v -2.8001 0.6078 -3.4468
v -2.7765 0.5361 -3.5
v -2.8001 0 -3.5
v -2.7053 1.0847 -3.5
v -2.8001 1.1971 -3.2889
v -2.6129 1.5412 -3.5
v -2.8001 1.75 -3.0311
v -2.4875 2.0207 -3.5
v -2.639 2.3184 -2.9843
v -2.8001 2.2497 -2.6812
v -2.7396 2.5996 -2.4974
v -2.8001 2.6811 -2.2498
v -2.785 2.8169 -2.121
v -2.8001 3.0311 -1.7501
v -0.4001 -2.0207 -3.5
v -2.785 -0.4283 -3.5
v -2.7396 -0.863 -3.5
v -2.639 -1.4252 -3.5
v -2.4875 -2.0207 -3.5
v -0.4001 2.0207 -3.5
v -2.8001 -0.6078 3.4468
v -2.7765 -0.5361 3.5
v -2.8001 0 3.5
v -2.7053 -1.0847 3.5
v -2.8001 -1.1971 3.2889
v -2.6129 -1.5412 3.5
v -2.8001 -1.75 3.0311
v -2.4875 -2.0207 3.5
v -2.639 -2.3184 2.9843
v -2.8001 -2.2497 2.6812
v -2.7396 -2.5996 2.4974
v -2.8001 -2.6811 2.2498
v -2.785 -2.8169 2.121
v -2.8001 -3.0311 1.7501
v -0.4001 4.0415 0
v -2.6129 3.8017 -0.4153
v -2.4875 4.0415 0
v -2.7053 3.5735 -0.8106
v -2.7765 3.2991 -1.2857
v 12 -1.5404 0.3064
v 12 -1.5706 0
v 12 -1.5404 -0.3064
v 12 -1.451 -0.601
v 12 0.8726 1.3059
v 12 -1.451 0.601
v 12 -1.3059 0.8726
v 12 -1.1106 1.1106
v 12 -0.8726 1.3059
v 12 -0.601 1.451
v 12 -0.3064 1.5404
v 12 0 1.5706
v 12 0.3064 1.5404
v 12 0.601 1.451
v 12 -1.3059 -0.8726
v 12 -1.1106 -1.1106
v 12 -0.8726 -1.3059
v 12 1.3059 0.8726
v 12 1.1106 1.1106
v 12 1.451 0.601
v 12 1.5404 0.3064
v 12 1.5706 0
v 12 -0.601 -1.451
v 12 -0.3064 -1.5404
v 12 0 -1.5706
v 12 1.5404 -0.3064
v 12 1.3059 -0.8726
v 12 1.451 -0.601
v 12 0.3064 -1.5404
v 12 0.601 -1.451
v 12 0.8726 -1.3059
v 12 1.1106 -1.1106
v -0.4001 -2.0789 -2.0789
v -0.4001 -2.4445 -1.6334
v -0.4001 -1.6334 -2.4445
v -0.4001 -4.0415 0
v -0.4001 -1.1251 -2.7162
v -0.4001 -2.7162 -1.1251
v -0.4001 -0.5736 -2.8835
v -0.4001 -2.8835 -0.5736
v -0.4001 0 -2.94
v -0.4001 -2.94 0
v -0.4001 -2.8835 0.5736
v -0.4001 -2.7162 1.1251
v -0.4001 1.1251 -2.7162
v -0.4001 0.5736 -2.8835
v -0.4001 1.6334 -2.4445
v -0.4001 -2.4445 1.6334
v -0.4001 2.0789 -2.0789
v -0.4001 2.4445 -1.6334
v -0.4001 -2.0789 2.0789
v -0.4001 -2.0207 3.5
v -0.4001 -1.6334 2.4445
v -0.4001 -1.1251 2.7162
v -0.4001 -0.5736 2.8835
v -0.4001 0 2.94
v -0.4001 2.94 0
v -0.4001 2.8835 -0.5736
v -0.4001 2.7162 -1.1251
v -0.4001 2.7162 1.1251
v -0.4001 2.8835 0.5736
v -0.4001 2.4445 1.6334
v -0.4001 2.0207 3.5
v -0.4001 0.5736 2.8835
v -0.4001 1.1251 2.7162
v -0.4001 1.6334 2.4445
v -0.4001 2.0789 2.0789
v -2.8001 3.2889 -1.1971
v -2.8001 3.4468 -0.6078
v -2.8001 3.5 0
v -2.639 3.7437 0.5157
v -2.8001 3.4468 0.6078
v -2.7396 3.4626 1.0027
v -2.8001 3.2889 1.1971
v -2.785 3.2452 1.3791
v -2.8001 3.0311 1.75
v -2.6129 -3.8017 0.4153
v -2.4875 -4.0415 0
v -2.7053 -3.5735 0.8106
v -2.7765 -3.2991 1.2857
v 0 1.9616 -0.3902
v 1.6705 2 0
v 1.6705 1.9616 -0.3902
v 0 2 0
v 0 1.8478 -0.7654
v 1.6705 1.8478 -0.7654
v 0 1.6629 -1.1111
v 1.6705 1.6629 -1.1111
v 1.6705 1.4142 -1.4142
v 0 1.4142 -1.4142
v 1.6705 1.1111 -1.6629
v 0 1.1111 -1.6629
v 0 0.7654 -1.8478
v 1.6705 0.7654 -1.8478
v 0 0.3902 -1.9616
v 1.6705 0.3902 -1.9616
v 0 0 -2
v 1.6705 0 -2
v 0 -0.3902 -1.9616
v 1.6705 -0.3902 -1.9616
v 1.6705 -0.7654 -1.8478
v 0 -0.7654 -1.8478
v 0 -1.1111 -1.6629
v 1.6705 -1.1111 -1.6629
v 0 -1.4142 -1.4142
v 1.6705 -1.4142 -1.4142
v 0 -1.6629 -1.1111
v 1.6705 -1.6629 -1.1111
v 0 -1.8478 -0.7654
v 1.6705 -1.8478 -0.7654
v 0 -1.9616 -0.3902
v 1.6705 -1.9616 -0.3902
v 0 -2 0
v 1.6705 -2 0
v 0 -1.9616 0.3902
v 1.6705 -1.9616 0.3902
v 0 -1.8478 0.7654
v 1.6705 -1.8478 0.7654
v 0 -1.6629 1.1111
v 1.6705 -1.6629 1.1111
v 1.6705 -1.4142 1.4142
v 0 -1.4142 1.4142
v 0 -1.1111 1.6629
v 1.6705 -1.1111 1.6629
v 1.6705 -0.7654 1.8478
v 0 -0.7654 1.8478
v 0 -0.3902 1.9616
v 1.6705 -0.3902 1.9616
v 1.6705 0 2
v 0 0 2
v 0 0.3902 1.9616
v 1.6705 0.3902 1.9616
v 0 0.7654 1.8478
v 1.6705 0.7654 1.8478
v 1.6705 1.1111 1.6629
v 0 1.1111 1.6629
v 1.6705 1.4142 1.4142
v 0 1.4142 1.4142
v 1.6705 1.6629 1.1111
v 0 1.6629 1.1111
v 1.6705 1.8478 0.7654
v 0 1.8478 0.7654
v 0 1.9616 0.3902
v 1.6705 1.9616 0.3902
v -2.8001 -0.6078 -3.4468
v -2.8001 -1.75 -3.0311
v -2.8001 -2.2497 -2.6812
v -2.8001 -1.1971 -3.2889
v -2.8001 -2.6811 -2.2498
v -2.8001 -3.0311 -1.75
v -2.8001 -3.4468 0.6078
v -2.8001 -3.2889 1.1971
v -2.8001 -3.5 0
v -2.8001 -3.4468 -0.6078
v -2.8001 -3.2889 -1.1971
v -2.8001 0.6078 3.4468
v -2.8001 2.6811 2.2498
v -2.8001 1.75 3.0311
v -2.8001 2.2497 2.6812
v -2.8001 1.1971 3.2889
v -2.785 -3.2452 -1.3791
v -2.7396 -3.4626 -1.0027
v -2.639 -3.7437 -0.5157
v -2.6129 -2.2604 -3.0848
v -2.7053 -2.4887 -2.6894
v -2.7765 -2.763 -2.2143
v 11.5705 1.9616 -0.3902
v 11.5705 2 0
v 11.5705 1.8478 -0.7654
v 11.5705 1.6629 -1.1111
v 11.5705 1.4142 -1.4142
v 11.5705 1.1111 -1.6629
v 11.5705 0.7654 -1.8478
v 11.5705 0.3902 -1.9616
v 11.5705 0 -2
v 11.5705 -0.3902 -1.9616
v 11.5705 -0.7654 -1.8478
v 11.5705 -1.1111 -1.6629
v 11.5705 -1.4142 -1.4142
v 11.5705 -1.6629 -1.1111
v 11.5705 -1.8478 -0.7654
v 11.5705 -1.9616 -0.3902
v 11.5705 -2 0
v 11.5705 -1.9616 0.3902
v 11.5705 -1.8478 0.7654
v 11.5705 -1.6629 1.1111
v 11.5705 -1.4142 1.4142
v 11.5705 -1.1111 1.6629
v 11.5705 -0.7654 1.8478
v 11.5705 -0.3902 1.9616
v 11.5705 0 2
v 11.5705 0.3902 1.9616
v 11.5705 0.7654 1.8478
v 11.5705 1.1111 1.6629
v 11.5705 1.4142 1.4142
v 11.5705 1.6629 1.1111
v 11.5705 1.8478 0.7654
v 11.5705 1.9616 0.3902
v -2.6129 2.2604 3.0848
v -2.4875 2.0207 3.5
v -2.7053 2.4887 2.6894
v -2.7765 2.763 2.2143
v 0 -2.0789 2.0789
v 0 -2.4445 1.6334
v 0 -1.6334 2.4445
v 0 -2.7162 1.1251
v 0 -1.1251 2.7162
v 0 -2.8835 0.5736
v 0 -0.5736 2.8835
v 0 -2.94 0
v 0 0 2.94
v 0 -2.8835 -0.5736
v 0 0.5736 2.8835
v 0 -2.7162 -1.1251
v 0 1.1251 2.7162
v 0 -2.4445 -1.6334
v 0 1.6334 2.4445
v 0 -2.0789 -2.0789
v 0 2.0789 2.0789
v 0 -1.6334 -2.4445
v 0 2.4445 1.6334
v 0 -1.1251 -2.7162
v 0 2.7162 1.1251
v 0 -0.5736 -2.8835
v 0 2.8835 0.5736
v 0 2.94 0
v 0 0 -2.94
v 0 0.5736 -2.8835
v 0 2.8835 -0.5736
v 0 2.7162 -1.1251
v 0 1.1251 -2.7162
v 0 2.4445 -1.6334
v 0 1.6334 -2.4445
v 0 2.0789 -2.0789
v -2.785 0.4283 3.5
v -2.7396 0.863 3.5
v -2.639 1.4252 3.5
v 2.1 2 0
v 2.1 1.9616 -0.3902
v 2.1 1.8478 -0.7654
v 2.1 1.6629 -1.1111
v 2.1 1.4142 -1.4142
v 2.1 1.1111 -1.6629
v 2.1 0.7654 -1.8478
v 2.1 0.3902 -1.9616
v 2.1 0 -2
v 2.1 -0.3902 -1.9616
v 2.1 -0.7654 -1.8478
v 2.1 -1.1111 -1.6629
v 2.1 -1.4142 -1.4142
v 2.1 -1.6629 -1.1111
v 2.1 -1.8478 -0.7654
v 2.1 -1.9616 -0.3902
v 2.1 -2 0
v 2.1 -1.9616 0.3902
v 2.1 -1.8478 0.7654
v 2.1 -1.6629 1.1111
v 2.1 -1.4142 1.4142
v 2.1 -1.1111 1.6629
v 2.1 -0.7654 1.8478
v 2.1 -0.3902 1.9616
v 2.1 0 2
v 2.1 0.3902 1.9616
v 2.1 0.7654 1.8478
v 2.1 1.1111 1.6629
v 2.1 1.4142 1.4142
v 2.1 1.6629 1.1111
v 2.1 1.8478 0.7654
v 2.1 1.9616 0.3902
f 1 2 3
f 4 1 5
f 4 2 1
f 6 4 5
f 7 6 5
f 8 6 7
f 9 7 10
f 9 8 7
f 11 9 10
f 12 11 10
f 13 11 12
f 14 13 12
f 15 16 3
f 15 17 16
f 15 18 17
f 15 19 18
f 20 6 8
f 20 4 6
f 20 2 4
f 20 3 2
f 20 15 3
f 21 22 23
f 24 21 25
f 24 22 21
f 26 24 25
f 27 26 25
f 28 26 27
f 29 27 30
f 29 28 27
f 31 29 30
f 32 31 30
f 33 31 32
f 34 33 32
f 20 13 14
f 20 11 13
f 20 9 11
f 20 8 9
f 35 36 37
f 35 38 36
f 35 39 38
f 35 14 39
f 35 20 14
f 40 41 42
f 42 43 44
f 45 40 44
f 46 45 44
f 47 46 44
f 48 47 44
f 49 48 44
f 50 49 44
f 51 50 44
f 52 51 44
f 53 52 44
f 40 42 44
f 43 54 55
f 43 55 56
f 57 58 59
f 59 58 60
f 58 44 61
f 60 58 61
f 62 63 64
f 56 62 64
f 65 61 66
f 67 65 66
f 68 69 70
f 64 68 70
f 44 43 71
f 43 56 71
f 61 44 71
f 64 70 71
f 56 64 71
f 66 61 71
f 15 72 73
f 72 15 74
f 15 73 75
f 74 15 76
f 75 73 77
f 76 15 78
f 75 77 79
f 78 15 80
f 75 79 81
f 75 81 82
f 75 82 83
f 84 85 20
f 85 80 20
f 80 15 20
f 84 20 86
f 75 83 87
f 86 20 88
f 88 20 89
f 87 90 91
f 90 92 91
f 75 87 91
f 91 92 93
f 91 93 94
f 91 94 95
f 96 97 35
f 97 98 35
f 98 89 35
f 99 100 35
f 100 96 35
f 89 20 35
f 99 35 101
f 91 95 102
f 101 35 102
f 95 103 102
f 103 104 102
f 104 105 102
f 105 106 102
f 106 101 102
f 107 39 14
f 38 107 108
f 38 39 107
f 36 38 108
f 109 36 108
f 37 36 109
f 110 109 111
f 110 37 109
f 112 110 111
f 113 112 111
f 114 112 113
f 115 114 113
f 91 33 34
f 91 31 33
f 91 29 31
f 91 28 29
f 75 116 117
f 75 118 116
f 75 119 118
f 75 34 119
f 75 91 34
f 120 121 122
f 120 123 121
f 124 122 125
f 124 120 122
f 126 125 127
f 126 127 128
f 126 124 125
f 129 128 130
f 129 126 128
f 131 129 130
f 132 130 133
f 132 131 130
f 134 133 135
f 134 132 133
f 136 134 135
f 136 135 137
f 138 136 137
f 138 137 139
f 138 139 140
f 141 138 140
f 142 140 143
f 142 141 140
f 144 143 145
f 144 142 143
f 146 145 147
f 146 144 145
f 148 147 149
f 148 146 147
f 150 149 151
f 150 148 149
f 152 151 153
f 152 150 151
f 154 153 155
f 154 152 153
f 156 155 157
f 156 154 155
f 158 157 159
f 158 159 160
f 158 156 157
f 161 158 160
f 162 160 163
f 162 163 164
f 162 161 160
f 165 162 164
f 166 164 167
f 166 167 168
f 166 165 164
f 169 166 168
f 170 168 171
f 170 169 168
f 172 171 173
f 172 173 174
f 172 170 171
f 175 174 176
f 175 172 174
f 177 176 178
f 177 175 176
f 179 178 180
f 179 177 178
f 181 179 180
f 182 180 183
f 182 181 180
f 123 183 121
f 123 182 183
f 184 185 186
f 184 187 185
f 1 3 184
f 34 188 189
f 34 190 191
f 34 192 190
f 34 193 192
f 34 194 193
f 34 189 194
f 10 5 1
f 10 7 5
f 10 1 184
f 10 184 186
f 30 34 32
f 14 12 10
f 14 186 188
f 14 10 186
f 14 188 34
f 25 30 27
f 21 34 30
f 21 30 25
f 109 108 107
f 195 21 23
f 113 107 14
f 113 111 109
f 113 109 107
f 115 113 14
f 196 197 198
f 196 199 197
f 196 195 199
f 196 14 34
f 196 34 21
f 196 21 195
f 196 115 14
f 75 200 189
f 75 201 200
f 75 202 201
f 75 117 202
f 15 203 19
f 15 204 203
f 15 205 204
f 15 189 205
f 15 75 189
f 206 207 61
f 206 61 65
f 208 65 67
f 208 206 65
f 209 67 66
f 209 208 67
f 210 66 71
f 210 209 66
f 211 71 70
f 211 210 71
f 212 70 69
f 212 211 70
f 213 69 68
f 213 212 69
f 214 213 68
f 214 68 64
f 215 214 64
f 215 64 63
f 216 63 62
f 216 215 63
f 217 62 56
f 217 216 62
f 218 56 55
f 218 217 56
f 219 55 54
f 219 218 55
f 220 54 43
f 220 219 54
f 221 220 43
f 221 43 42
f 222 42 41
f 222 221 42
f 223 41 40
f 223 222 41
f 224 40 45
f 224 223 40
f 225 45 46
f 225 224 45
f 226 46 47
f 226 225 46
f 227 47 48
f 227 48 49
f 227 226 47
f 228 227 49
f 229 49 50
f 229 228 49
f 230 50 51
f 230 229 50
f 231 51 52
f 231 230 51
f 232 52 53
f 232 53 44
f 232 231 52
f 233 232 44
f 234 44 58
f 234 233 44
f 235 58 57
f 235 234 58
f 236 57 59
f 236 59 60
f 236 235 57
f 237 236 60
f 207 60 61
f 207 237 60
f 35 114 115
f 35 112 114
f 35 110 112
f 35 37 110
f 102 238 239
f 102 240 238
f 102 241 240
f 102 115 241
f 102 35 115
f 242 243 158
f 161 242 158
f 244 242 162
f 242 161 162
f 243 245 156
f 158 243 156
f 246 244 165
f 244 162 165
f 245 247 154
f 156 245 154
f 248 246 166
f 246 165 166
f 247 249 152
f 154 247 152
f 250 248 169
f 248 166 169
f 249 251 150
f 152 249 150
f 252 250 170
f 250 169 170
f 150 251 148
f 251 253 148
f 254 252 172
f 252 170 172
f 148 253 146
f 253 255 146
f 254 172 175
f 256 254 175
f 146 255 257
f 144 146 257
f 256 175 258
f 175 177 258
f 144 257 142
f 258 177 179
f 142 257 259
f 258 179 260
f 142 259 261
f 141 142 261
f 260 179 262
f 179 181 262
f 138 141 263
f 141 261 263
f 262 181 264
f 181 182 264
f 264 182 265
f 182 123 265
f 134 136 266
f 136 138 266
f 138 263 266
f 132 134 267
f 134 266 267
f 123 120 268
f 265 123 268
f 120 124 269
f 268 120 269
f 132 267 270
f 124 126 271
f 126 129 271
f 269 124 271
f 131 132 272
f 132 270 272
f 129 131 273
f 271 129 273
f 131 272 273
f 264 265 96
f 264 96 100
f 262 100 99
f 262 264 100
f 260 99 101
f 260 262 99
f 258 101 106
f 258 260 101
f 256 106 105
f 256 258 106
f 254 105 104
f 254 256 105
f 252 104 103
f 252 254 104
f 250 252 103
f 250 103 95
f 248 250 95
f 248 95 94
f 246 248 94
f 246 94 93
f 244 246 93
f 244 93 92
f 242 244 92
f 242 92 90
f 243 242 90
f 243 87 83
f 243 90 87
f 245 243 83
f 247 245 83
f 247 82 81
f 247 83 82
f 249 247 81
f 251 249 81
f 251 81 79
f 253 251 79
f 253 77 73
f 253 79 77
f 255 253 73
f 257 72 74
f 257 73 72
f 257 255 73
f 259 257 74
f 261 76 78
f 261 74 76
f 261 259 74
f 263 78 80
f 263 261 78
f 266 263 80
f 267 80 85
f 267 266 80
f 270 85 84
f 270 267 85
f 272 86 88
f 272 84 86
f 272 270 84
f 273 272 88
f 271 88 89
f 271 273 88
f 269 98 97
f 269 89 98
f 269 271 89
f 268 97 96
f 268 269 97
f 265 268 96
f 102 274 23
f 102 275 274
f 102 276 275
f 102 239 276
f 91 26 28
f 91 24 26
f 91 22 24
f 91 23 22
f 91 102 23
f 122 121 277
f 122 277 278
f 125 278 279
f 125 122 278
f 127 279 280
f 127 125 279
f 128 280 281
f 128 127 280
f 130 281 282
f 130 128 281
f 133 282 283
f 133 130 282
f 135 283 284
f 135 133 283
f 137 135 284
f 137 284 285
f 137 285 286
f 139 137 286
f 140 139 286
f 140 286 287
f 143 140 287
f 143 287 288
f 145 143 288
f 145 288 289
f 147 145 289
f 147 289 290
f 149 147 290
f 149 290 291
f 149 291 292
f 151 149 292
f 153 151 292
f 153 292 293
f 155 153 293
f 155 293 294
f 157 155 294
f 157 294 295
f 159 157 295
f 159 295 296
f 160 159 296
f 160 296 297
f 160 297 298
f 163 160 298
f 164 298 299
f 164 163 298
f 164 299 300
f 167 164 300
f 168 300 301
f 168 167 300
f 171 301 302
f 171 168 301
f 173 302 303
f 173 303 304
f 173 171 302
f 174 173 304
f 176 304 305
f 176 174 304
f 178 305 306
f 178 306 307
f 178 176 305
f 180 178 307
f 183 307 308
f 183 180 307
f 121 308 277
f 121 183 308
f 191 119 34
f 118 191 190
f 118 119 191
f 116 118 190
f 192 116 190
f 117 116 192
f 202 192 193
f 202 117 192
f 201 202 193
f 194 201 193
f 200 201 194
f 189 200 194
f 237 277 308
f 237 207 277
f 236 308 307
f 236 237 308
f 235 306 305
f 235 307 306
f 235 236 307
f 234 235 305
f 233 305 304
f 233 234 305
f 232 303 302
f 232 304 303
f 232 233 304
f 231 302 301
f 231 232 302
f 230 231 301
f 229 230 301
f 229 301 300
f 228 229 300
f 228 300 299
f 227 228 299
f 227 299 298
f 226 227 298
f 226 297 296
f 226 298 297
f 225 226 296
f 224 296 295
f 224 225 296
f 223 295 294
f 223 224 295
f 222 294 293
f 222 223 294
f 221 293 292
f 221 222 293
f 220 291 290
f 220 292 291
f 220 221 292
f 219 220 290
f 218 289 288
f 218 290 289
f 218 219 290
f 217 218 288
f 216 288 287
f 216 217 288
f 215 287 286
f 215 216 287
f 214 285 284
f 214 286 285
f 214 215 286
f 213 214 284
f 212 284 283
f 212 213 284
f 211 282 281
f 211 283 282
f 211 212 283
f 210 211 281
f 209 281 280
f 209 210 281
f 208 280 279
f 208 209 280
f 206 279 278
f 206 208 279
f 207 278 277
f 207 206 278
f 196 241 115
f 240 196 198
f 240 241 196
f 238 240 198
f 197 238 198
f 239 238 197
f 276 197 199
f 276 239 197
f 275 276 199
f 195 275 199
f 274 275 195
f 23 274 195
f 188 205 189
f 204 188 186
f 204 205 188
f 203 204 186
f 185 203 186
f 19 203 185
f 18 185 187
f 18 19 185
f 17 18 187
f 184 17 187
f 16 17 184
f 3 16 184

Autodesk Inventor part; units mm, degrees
ref_plane "YZ Plane" through (0, 0, 0) normal (1, 0, 0) x (0, 1, 0)
ref_plane "XZ Plane" through (0, 0, 0) normal (0, 1, 0) x (-1, 0, 0)
sketch "Sketch1" plane through (0, 0, 0) normal (0, 0, 1) x (1, 0, 0)
  line L0 (0, 2.94) -> (0, 2)
  line L1 (2.1, 2) -> (12, 2)
  line L2 (12, 2) -> (12, 0)
  line L3 (12, 0) -> (-0.4001, 0)
  line L4 (-2.8801, 0) -> (14.48, 0) projected
  line L5 (-0.4001, 0) -> (-0.4001, 2.94)
  line L6 (-0.4001, 2.94) -> (0, 2.94)
  line L7 (2.1, 2) -> (1.6705, 2)
  line L8 (1.6705, 2) -> (0, 2)
  line L9 (0, -0.588) -> (0, 3.528) projected
  dimension "d0" = 12
  dimension "d1" = 9.9
  dimension "d2" = 4
  dimension "d9" = 0.4001
  dimension "d10" = 5.88
  dimension "d13" = 0.4295
  dimension "d14" = 4
revolve "Body" add sketch "Sketch1" angle 360 about axis through (12, 0, 0) along (-1, 0, 0)
sketch "Sketch2" plane through (-0.4001, 0, 0) normal (-1, 0, 0) x (0, 0, 1)
  line L0 (0, 4.0415) -> (3.5, 2.0207)
  line L1 (3.5, 2.0207) -> (3.5, -2.0207)
  line L2 (3.5, -2.0207) -> (0, -4.0415)
  line L3 (0, -4.0415) -> (-3.5, -2.0207)
  line L4 (-3.5, -2.0207) -> (-3.5, 2.0207)
  line L5 (-3.5, 2.0207) -> (0, 4.0415)
  point P0 (0, 0)
  point P1 (0, 0)
  dimension "d11" = 7
extrude "Head" add sketch "Sketch2" along normal blind 2.4
sketch "Sketch4" plane through (0, 0, 0) normal (0, 0, 1) x (1, 0, 0)
  line L0 (-2.8001, 3.5) -> (-2.8001, 4.0415)
  line L1 (-2.8001, 4.0415) -> (-2.4875, 4.0415)
  line L2 (-2.4875, 4.0415) -> (-2.8001, 3.5)
  line L3 (-3.2801, 0) -> (0.0799, 0) projected
  line L4 (-0.4001, 4.0415) -> (-2.8001, 4.0415) projected
  line L5 (-2.8001, 2.0207) -> (-2.8001, 4.0415) projected
  dimension "d5" = 30
  dimension "d19" = 7
revolve "Chamfer1" cut sketch "Sketch4" angle 360 about axis through (-10, 0, 0) along (1, 0, 0)
thread "Thread" size "M4x0.7" class "6g" standard "ISO Metric profile" length 9.9
chamfer "Chamfer2" distance 0.4294 distance2 0.4295 1 edges at (12, -2, 0) measured on face at (12, 0.1822, 0.4036)
ref_plane "Work Plane1" through (1.525, 0, 0) normal (0, 0, 1) x (1, 0, 0)
equation "\"d0\" = NLG"
equation "\"d1\" = GEL"
equation "\"d2\" = GD"
equation "\"d10\" = SD2"
equation "\"d14\" = BDM"
equation "\"d11\" = SW"
equation "\"d3\" = KOH - SD"
equation "\"d5\" = ANG1"
equation "\"d19\" = SW0"
equation "\"d15\" = GEL"
equation "\"d6\" = -0.5 * SPD + 0.5 * GD"
equation "\"NLG\" = 12"
equation "\"GD\" = NND"
equation "\"BDM\" = NND"
equation "\"KOH\" = 2.8"
equation "\"GEL\" = 9.9"
equation "\"SW\" = 7"
equation "\"SW0\" = SW"
equation "\"SPD\" = NND - 1.2269 * PTC"
equation "\"SD2\" = 5.88"
equation "\"SD\" = 0.4"
equation "\"ANG1\" = 30deg"
equation "\"GAL\" = 0.61345 * PTC"
equation "\"GUL\" = 0.61345 * PTC"
equation "\"RR\" = 0.2"
equation "\"GD1\" = THREADDIA - 1.2269 * PTC"
equation "\"THREADDIA\" = 4"
equation "\"SDH\" = SD2"
equation "\"SDHG\" = 2.1"
equation "\"TOA\" = 30deg"
equation "\"PTC\" = 0.7"
equation "\"NND\" = 4"
equation "\"E0\" = 8.085"
properties part number "ISO 4017 - M4 x 12" material "Stainless Steel, 440C"
